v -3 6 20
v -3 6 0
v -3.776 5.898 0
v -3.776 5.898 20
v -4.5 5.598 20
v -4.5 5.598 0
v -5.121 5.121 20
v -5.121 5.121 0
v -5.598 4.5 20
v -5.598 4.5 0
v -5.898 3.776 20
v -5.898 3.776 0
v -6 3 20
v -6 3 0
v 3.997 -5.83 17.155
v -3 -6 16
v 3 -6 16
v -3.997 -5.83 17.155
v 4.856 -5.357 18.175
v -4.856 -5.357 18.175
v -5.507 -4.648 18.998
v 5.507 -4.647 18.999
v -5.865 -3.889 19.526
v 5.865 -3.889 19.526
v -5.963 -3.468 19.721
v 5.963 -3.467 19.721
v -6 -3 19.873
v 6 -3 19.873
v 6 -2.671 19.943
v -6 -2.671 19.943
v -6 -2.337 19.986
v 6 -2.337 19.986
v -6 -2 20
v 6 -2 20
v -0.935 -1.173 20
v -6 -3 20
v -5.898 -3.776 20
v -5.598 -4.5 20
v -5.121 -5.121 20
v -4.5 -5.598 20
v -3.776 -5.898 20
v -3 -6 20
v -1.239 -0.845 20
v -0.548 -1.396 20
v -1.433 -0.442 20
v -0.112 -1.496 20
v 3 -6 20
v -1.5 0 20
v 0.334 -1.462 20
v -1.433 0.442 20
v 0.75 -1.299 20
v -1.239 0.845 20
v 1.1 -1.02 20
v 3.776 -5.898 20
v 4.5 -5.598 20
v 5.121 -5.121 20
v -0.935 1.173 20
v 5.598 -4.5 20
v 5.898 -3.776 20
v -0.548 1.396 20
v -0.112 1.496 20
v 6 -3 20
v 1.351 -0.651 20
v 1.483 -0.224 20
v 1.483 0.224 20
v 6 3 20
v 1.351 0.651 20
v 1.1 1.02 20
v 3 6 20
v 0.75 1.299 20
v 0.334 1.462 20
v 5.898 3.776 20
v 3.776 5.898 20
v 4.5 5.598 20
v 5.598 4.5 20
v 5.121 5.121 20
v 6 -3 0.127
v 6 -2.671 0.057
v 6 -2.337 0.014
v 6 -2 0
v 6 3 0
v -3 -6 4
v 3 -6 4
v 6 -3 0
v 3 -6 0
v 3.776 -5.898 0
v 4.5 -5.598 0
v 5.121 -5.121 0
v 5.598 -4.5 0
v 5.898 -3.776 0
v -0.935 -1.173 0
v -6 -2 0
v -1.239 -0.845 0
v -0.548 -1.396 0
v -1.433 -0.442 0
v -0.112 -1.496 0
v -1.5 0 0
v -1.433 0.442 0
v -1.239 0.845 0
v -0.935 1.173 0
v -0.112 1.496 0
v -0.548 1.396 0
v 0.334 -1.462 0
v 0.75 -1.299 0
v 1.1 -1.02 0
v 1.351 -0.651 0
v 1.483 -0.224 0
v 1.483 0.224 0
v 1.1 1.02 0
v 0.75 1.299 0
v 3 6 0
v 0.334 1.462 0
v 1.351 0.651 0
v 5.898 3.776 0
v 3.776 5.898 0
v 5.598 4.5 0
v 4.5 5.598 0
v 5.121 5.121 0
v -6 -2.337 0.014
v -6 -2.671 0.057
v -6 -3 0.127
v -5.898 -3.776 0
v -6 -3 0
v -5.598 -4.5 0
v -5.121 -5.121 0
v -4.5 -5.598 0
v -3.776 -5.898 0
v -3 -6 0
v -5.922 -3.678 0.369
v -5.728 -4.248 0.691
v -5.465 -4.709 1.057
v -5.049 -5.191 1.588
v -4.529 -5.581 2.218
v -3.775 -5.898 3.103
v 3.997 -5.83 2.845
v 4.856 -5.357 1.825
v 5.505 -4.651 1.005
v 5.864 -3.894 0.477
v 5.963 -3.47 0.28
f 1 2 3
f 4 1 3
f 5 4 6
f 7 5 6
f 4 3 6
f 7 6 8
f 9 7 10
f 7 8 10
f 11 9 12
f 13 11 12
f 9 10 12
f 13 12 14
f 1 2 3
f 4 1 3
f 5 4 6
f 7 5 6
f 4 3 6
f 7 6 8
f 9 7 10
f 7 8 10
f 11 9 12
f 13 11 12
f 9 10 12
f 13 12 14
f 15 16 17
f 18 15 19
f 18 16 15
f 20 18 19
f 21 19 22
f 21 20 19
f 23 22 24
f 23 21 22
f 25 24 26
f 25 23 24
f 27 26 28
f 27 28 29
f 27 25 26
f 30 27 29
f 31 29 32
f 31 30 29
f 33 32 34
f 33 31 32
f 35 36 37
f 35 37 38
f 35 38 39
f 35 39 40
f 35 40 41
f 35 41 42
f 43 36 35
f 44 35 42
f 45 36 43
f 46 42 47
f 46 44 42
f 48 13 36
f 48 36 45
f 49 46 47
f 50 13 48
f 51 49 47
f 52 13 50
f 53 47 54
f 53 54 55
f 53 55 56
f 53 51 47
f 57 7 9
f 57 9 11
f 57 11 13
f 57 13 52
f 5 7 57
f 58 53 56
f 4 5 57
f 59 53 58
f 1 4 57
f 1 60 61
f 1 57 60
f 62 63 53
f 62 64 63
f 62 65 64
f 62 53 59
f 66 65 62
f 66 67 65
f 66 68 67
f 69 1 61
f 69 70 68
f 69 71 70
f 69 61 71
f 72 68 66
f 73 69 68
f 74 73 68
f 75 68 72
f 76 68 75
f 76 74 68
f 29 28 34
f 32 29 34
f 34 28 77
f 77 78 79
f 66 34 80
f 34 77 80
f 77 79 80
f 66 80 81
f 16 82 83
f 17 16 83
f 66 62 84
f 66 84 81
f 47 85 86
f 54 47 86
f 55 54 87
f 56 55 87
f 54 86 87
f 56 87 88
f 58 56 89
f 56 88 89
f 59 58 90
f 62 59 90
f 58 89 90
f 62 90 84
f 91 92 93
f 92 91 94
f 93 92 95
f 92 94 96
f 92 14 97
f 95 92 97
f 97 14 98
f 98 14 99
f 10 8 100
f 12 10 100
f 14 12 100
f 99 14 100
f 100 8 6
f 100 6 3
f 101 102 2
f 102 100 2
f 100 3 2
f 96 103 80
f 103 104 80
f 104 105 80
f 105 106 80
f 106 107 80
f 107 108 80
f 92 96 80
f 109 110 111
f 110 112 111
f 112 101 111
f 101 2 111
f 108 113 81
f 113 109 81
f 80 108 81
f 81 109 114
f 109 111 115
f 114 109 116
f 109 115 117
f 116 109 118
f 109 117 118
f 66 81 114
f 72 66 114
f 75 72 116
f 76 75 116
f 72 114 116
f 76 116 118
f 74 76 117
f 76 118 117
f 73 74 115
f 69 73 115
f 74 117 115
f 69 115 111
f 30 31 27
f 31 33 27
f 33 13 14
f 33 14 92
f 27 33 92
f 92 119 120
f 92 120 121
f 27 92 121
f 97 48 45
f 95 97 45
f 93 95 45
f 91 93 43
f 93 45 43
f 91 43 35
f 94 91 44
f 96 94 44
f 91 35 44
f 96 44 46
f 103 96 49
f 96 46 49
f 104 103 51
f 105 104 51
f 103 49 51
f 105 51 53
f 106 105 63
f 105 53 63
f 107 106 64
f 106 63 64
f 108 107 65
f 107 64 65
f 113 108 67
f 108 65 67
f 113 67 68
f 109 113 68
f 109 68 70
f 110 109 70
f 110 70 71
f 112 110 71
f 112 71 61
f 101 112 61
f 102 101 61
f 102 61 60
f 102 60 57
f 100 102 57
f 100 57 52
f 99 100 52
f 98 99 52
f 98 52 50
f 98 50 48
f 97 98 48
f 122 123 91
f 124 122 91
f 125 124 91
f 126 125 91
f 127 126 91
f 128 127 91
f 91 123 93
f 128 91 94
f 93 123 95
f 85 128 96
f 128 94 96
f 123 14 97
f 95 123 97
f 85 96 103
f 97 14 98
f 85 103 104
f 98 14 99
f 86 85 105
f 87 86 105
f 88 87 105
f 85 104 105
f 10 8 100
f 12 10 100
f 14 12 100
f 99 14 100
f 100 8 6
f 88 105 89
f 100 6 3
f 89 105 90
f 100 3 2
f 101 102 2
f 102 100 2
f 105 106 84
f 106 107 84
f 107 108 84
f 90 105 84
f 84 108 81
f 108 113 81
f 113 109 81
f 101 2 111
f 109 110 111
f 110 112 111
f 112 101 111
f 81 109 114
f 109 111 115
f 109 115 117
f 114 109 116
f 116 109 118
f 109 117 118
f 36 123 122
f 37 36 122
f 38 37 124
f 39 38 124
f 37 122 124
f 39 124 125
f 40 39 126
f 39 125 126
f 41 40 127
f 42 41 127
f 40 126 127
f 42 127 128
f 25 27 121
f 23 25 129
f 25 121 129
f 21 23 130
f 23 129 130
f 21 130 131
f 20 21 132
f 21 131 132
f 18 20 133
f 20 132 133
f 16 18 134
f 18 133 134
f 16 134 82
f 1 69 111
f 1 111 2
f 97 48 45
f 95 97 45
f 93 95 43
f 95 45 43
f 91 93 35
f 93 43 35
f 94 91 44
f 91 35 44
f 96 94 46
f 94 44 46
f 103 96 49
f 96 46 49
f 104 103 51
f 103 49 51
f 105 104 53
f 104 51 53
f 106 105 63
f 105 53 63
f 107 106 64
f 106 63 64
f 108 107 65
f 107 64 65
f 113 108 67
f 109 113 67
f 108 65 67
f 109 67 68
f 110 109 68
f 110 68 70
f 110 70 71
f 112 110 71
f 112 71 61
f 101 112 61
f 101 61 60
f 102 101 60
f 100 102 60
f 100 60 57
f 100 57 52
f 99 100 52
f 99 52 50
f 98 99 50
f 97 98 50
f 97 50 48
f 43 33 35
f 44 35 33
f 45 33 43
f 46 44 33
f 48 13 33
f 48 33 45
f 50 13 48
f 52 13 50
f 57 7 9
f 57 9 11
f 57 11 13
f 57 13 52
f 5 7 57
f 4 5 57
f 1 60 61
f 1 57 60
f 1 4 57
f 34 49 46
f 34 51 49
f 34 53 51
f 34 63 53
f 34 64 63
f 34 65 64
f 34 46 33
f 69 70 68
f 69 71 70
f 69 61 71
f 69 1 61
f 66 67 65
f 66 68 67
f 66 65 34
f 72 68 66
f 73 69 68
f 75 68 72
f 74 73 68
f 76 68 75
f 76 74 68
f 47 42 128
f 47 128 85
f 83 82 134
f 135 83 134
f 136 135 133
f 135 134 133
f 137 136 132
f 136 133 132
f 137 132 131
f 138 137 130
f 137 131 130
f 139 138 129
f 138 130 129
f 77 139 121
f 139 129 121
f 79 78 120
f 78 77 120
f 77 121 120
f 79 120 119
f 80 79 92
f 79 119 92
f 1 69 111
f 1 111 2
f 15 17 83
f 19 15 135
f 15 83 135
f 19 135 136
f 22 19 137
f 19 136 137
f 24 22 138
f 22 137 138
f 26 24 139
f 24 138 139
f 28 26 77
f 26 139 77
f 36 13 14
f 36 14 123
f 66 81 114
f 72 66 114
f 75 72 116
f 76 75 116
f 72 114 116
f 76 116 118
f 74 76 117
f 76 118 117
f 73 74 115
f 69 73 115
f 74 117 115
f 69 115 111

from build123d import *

# Parameters (mm, degrees)
F1_DEPTH    = 20
F2_DEPTH    = 20
F3_T1_DEPTH = 26
F4_D        = 3
F4_2_D      = 3


# Not quite as in the source:
# - a fillet or chamfer that OpenCascade refuses, or shapes differently, is made with other operations: its cross-section is extruded or revolved along the edge and cut away or added


with BuildPart() as f1:
    # F0 (on Top) → F1 (new body)
    with BuildSketch(Plane.XY):
        with BuildLine():
            ThreePointArc((6, 3), (5.1213203436, 5.1213203436), (3, 6))
            Line((3, 6), (-3, 6))
            ThreePointArc((-3, 6), (-5.1213203436, 5.1213203436), (-6, 3))
            Line((-6, 3), (-6, -3))
            ThreePointArc((-6, -3), (-5.1213203436, -5.1213203436), (-3, -6))
            Line((-3, -6), (3, -6))
            ThreePointArc((3, -6), (5.1213203436, -5.1213203436), (6, -3))
            Line((6, -3), (6, 3))
        make_face()
    extrude(amount=F1_DEPTH)

    # F4 (through all)
    with Locations(Plane(origin=(0, 0, 0), x_dir=(1, 0, 0), z_dir=(0, 0, -1))):
        with Locations((0, 0)):
            Hole(F4_D / 2)


with BuildPart() as f2:
    # F0 (on Top) → F2 (new body)
    with BuildSketch(Plane.XY):
        with BuildLine():
            ThreePointArc((6, 3), (5.1213203436, 5.1213203436), (3, 6))
            Line((3, 6), (-3, 6))
            ThreePointArc((-3, 6), (-5.1213203436, 5.1213203436), (-6, 3))
            Line((-6, 3), (-6, -3))
            ThreePointArc((-6, -3), (-5.1213203436, -5.1213203436), (-3, -6))
            Line((-3, -6), (3, -6))
            ThreePointArc((3, -6), (5.1213203436, -5.1213203436), (6, -3))
            Line((6, -3), (6, 3))
        make_face()
    extrude(amount=F2_DEPTH)

    # F3: fillet of radius 4 on 2 edges, made by hand

    # F3_s2 → F3_t1 (cut)
    with BuildSketch(Plane.YZ.offset(-13)):
        with BuildLine():
            ThreePointArc((-6, 16), (-4.8284271247, 18.8284271247), (-2, 20))
            Line((-2, 20), (-6, 20))
            Line((-6, 20), (-6, 16))
        make_face()
        with BuildLine():
            ThreePointArc((-6, 4), (-4.8284271247, 1.1715728753), (-2, 0))
            Line((-2, 0), (-6, 0))
            Line((-6, 0), (-6, 4))
        make_face()
    extrude(amount=F3_T1_DEPTH, mode=Mode.SUBTRACT)

    # F4#2 (through all)
    with Locations(Plane(origin=(0, 0, 0), x_dir=(1, 0, 0), z_dir=(0, 0, -1))):
        with Locations((0, 0)):
            Hole(F4_2_D / 2)


solid = Compound([f1.part, f2.part])
